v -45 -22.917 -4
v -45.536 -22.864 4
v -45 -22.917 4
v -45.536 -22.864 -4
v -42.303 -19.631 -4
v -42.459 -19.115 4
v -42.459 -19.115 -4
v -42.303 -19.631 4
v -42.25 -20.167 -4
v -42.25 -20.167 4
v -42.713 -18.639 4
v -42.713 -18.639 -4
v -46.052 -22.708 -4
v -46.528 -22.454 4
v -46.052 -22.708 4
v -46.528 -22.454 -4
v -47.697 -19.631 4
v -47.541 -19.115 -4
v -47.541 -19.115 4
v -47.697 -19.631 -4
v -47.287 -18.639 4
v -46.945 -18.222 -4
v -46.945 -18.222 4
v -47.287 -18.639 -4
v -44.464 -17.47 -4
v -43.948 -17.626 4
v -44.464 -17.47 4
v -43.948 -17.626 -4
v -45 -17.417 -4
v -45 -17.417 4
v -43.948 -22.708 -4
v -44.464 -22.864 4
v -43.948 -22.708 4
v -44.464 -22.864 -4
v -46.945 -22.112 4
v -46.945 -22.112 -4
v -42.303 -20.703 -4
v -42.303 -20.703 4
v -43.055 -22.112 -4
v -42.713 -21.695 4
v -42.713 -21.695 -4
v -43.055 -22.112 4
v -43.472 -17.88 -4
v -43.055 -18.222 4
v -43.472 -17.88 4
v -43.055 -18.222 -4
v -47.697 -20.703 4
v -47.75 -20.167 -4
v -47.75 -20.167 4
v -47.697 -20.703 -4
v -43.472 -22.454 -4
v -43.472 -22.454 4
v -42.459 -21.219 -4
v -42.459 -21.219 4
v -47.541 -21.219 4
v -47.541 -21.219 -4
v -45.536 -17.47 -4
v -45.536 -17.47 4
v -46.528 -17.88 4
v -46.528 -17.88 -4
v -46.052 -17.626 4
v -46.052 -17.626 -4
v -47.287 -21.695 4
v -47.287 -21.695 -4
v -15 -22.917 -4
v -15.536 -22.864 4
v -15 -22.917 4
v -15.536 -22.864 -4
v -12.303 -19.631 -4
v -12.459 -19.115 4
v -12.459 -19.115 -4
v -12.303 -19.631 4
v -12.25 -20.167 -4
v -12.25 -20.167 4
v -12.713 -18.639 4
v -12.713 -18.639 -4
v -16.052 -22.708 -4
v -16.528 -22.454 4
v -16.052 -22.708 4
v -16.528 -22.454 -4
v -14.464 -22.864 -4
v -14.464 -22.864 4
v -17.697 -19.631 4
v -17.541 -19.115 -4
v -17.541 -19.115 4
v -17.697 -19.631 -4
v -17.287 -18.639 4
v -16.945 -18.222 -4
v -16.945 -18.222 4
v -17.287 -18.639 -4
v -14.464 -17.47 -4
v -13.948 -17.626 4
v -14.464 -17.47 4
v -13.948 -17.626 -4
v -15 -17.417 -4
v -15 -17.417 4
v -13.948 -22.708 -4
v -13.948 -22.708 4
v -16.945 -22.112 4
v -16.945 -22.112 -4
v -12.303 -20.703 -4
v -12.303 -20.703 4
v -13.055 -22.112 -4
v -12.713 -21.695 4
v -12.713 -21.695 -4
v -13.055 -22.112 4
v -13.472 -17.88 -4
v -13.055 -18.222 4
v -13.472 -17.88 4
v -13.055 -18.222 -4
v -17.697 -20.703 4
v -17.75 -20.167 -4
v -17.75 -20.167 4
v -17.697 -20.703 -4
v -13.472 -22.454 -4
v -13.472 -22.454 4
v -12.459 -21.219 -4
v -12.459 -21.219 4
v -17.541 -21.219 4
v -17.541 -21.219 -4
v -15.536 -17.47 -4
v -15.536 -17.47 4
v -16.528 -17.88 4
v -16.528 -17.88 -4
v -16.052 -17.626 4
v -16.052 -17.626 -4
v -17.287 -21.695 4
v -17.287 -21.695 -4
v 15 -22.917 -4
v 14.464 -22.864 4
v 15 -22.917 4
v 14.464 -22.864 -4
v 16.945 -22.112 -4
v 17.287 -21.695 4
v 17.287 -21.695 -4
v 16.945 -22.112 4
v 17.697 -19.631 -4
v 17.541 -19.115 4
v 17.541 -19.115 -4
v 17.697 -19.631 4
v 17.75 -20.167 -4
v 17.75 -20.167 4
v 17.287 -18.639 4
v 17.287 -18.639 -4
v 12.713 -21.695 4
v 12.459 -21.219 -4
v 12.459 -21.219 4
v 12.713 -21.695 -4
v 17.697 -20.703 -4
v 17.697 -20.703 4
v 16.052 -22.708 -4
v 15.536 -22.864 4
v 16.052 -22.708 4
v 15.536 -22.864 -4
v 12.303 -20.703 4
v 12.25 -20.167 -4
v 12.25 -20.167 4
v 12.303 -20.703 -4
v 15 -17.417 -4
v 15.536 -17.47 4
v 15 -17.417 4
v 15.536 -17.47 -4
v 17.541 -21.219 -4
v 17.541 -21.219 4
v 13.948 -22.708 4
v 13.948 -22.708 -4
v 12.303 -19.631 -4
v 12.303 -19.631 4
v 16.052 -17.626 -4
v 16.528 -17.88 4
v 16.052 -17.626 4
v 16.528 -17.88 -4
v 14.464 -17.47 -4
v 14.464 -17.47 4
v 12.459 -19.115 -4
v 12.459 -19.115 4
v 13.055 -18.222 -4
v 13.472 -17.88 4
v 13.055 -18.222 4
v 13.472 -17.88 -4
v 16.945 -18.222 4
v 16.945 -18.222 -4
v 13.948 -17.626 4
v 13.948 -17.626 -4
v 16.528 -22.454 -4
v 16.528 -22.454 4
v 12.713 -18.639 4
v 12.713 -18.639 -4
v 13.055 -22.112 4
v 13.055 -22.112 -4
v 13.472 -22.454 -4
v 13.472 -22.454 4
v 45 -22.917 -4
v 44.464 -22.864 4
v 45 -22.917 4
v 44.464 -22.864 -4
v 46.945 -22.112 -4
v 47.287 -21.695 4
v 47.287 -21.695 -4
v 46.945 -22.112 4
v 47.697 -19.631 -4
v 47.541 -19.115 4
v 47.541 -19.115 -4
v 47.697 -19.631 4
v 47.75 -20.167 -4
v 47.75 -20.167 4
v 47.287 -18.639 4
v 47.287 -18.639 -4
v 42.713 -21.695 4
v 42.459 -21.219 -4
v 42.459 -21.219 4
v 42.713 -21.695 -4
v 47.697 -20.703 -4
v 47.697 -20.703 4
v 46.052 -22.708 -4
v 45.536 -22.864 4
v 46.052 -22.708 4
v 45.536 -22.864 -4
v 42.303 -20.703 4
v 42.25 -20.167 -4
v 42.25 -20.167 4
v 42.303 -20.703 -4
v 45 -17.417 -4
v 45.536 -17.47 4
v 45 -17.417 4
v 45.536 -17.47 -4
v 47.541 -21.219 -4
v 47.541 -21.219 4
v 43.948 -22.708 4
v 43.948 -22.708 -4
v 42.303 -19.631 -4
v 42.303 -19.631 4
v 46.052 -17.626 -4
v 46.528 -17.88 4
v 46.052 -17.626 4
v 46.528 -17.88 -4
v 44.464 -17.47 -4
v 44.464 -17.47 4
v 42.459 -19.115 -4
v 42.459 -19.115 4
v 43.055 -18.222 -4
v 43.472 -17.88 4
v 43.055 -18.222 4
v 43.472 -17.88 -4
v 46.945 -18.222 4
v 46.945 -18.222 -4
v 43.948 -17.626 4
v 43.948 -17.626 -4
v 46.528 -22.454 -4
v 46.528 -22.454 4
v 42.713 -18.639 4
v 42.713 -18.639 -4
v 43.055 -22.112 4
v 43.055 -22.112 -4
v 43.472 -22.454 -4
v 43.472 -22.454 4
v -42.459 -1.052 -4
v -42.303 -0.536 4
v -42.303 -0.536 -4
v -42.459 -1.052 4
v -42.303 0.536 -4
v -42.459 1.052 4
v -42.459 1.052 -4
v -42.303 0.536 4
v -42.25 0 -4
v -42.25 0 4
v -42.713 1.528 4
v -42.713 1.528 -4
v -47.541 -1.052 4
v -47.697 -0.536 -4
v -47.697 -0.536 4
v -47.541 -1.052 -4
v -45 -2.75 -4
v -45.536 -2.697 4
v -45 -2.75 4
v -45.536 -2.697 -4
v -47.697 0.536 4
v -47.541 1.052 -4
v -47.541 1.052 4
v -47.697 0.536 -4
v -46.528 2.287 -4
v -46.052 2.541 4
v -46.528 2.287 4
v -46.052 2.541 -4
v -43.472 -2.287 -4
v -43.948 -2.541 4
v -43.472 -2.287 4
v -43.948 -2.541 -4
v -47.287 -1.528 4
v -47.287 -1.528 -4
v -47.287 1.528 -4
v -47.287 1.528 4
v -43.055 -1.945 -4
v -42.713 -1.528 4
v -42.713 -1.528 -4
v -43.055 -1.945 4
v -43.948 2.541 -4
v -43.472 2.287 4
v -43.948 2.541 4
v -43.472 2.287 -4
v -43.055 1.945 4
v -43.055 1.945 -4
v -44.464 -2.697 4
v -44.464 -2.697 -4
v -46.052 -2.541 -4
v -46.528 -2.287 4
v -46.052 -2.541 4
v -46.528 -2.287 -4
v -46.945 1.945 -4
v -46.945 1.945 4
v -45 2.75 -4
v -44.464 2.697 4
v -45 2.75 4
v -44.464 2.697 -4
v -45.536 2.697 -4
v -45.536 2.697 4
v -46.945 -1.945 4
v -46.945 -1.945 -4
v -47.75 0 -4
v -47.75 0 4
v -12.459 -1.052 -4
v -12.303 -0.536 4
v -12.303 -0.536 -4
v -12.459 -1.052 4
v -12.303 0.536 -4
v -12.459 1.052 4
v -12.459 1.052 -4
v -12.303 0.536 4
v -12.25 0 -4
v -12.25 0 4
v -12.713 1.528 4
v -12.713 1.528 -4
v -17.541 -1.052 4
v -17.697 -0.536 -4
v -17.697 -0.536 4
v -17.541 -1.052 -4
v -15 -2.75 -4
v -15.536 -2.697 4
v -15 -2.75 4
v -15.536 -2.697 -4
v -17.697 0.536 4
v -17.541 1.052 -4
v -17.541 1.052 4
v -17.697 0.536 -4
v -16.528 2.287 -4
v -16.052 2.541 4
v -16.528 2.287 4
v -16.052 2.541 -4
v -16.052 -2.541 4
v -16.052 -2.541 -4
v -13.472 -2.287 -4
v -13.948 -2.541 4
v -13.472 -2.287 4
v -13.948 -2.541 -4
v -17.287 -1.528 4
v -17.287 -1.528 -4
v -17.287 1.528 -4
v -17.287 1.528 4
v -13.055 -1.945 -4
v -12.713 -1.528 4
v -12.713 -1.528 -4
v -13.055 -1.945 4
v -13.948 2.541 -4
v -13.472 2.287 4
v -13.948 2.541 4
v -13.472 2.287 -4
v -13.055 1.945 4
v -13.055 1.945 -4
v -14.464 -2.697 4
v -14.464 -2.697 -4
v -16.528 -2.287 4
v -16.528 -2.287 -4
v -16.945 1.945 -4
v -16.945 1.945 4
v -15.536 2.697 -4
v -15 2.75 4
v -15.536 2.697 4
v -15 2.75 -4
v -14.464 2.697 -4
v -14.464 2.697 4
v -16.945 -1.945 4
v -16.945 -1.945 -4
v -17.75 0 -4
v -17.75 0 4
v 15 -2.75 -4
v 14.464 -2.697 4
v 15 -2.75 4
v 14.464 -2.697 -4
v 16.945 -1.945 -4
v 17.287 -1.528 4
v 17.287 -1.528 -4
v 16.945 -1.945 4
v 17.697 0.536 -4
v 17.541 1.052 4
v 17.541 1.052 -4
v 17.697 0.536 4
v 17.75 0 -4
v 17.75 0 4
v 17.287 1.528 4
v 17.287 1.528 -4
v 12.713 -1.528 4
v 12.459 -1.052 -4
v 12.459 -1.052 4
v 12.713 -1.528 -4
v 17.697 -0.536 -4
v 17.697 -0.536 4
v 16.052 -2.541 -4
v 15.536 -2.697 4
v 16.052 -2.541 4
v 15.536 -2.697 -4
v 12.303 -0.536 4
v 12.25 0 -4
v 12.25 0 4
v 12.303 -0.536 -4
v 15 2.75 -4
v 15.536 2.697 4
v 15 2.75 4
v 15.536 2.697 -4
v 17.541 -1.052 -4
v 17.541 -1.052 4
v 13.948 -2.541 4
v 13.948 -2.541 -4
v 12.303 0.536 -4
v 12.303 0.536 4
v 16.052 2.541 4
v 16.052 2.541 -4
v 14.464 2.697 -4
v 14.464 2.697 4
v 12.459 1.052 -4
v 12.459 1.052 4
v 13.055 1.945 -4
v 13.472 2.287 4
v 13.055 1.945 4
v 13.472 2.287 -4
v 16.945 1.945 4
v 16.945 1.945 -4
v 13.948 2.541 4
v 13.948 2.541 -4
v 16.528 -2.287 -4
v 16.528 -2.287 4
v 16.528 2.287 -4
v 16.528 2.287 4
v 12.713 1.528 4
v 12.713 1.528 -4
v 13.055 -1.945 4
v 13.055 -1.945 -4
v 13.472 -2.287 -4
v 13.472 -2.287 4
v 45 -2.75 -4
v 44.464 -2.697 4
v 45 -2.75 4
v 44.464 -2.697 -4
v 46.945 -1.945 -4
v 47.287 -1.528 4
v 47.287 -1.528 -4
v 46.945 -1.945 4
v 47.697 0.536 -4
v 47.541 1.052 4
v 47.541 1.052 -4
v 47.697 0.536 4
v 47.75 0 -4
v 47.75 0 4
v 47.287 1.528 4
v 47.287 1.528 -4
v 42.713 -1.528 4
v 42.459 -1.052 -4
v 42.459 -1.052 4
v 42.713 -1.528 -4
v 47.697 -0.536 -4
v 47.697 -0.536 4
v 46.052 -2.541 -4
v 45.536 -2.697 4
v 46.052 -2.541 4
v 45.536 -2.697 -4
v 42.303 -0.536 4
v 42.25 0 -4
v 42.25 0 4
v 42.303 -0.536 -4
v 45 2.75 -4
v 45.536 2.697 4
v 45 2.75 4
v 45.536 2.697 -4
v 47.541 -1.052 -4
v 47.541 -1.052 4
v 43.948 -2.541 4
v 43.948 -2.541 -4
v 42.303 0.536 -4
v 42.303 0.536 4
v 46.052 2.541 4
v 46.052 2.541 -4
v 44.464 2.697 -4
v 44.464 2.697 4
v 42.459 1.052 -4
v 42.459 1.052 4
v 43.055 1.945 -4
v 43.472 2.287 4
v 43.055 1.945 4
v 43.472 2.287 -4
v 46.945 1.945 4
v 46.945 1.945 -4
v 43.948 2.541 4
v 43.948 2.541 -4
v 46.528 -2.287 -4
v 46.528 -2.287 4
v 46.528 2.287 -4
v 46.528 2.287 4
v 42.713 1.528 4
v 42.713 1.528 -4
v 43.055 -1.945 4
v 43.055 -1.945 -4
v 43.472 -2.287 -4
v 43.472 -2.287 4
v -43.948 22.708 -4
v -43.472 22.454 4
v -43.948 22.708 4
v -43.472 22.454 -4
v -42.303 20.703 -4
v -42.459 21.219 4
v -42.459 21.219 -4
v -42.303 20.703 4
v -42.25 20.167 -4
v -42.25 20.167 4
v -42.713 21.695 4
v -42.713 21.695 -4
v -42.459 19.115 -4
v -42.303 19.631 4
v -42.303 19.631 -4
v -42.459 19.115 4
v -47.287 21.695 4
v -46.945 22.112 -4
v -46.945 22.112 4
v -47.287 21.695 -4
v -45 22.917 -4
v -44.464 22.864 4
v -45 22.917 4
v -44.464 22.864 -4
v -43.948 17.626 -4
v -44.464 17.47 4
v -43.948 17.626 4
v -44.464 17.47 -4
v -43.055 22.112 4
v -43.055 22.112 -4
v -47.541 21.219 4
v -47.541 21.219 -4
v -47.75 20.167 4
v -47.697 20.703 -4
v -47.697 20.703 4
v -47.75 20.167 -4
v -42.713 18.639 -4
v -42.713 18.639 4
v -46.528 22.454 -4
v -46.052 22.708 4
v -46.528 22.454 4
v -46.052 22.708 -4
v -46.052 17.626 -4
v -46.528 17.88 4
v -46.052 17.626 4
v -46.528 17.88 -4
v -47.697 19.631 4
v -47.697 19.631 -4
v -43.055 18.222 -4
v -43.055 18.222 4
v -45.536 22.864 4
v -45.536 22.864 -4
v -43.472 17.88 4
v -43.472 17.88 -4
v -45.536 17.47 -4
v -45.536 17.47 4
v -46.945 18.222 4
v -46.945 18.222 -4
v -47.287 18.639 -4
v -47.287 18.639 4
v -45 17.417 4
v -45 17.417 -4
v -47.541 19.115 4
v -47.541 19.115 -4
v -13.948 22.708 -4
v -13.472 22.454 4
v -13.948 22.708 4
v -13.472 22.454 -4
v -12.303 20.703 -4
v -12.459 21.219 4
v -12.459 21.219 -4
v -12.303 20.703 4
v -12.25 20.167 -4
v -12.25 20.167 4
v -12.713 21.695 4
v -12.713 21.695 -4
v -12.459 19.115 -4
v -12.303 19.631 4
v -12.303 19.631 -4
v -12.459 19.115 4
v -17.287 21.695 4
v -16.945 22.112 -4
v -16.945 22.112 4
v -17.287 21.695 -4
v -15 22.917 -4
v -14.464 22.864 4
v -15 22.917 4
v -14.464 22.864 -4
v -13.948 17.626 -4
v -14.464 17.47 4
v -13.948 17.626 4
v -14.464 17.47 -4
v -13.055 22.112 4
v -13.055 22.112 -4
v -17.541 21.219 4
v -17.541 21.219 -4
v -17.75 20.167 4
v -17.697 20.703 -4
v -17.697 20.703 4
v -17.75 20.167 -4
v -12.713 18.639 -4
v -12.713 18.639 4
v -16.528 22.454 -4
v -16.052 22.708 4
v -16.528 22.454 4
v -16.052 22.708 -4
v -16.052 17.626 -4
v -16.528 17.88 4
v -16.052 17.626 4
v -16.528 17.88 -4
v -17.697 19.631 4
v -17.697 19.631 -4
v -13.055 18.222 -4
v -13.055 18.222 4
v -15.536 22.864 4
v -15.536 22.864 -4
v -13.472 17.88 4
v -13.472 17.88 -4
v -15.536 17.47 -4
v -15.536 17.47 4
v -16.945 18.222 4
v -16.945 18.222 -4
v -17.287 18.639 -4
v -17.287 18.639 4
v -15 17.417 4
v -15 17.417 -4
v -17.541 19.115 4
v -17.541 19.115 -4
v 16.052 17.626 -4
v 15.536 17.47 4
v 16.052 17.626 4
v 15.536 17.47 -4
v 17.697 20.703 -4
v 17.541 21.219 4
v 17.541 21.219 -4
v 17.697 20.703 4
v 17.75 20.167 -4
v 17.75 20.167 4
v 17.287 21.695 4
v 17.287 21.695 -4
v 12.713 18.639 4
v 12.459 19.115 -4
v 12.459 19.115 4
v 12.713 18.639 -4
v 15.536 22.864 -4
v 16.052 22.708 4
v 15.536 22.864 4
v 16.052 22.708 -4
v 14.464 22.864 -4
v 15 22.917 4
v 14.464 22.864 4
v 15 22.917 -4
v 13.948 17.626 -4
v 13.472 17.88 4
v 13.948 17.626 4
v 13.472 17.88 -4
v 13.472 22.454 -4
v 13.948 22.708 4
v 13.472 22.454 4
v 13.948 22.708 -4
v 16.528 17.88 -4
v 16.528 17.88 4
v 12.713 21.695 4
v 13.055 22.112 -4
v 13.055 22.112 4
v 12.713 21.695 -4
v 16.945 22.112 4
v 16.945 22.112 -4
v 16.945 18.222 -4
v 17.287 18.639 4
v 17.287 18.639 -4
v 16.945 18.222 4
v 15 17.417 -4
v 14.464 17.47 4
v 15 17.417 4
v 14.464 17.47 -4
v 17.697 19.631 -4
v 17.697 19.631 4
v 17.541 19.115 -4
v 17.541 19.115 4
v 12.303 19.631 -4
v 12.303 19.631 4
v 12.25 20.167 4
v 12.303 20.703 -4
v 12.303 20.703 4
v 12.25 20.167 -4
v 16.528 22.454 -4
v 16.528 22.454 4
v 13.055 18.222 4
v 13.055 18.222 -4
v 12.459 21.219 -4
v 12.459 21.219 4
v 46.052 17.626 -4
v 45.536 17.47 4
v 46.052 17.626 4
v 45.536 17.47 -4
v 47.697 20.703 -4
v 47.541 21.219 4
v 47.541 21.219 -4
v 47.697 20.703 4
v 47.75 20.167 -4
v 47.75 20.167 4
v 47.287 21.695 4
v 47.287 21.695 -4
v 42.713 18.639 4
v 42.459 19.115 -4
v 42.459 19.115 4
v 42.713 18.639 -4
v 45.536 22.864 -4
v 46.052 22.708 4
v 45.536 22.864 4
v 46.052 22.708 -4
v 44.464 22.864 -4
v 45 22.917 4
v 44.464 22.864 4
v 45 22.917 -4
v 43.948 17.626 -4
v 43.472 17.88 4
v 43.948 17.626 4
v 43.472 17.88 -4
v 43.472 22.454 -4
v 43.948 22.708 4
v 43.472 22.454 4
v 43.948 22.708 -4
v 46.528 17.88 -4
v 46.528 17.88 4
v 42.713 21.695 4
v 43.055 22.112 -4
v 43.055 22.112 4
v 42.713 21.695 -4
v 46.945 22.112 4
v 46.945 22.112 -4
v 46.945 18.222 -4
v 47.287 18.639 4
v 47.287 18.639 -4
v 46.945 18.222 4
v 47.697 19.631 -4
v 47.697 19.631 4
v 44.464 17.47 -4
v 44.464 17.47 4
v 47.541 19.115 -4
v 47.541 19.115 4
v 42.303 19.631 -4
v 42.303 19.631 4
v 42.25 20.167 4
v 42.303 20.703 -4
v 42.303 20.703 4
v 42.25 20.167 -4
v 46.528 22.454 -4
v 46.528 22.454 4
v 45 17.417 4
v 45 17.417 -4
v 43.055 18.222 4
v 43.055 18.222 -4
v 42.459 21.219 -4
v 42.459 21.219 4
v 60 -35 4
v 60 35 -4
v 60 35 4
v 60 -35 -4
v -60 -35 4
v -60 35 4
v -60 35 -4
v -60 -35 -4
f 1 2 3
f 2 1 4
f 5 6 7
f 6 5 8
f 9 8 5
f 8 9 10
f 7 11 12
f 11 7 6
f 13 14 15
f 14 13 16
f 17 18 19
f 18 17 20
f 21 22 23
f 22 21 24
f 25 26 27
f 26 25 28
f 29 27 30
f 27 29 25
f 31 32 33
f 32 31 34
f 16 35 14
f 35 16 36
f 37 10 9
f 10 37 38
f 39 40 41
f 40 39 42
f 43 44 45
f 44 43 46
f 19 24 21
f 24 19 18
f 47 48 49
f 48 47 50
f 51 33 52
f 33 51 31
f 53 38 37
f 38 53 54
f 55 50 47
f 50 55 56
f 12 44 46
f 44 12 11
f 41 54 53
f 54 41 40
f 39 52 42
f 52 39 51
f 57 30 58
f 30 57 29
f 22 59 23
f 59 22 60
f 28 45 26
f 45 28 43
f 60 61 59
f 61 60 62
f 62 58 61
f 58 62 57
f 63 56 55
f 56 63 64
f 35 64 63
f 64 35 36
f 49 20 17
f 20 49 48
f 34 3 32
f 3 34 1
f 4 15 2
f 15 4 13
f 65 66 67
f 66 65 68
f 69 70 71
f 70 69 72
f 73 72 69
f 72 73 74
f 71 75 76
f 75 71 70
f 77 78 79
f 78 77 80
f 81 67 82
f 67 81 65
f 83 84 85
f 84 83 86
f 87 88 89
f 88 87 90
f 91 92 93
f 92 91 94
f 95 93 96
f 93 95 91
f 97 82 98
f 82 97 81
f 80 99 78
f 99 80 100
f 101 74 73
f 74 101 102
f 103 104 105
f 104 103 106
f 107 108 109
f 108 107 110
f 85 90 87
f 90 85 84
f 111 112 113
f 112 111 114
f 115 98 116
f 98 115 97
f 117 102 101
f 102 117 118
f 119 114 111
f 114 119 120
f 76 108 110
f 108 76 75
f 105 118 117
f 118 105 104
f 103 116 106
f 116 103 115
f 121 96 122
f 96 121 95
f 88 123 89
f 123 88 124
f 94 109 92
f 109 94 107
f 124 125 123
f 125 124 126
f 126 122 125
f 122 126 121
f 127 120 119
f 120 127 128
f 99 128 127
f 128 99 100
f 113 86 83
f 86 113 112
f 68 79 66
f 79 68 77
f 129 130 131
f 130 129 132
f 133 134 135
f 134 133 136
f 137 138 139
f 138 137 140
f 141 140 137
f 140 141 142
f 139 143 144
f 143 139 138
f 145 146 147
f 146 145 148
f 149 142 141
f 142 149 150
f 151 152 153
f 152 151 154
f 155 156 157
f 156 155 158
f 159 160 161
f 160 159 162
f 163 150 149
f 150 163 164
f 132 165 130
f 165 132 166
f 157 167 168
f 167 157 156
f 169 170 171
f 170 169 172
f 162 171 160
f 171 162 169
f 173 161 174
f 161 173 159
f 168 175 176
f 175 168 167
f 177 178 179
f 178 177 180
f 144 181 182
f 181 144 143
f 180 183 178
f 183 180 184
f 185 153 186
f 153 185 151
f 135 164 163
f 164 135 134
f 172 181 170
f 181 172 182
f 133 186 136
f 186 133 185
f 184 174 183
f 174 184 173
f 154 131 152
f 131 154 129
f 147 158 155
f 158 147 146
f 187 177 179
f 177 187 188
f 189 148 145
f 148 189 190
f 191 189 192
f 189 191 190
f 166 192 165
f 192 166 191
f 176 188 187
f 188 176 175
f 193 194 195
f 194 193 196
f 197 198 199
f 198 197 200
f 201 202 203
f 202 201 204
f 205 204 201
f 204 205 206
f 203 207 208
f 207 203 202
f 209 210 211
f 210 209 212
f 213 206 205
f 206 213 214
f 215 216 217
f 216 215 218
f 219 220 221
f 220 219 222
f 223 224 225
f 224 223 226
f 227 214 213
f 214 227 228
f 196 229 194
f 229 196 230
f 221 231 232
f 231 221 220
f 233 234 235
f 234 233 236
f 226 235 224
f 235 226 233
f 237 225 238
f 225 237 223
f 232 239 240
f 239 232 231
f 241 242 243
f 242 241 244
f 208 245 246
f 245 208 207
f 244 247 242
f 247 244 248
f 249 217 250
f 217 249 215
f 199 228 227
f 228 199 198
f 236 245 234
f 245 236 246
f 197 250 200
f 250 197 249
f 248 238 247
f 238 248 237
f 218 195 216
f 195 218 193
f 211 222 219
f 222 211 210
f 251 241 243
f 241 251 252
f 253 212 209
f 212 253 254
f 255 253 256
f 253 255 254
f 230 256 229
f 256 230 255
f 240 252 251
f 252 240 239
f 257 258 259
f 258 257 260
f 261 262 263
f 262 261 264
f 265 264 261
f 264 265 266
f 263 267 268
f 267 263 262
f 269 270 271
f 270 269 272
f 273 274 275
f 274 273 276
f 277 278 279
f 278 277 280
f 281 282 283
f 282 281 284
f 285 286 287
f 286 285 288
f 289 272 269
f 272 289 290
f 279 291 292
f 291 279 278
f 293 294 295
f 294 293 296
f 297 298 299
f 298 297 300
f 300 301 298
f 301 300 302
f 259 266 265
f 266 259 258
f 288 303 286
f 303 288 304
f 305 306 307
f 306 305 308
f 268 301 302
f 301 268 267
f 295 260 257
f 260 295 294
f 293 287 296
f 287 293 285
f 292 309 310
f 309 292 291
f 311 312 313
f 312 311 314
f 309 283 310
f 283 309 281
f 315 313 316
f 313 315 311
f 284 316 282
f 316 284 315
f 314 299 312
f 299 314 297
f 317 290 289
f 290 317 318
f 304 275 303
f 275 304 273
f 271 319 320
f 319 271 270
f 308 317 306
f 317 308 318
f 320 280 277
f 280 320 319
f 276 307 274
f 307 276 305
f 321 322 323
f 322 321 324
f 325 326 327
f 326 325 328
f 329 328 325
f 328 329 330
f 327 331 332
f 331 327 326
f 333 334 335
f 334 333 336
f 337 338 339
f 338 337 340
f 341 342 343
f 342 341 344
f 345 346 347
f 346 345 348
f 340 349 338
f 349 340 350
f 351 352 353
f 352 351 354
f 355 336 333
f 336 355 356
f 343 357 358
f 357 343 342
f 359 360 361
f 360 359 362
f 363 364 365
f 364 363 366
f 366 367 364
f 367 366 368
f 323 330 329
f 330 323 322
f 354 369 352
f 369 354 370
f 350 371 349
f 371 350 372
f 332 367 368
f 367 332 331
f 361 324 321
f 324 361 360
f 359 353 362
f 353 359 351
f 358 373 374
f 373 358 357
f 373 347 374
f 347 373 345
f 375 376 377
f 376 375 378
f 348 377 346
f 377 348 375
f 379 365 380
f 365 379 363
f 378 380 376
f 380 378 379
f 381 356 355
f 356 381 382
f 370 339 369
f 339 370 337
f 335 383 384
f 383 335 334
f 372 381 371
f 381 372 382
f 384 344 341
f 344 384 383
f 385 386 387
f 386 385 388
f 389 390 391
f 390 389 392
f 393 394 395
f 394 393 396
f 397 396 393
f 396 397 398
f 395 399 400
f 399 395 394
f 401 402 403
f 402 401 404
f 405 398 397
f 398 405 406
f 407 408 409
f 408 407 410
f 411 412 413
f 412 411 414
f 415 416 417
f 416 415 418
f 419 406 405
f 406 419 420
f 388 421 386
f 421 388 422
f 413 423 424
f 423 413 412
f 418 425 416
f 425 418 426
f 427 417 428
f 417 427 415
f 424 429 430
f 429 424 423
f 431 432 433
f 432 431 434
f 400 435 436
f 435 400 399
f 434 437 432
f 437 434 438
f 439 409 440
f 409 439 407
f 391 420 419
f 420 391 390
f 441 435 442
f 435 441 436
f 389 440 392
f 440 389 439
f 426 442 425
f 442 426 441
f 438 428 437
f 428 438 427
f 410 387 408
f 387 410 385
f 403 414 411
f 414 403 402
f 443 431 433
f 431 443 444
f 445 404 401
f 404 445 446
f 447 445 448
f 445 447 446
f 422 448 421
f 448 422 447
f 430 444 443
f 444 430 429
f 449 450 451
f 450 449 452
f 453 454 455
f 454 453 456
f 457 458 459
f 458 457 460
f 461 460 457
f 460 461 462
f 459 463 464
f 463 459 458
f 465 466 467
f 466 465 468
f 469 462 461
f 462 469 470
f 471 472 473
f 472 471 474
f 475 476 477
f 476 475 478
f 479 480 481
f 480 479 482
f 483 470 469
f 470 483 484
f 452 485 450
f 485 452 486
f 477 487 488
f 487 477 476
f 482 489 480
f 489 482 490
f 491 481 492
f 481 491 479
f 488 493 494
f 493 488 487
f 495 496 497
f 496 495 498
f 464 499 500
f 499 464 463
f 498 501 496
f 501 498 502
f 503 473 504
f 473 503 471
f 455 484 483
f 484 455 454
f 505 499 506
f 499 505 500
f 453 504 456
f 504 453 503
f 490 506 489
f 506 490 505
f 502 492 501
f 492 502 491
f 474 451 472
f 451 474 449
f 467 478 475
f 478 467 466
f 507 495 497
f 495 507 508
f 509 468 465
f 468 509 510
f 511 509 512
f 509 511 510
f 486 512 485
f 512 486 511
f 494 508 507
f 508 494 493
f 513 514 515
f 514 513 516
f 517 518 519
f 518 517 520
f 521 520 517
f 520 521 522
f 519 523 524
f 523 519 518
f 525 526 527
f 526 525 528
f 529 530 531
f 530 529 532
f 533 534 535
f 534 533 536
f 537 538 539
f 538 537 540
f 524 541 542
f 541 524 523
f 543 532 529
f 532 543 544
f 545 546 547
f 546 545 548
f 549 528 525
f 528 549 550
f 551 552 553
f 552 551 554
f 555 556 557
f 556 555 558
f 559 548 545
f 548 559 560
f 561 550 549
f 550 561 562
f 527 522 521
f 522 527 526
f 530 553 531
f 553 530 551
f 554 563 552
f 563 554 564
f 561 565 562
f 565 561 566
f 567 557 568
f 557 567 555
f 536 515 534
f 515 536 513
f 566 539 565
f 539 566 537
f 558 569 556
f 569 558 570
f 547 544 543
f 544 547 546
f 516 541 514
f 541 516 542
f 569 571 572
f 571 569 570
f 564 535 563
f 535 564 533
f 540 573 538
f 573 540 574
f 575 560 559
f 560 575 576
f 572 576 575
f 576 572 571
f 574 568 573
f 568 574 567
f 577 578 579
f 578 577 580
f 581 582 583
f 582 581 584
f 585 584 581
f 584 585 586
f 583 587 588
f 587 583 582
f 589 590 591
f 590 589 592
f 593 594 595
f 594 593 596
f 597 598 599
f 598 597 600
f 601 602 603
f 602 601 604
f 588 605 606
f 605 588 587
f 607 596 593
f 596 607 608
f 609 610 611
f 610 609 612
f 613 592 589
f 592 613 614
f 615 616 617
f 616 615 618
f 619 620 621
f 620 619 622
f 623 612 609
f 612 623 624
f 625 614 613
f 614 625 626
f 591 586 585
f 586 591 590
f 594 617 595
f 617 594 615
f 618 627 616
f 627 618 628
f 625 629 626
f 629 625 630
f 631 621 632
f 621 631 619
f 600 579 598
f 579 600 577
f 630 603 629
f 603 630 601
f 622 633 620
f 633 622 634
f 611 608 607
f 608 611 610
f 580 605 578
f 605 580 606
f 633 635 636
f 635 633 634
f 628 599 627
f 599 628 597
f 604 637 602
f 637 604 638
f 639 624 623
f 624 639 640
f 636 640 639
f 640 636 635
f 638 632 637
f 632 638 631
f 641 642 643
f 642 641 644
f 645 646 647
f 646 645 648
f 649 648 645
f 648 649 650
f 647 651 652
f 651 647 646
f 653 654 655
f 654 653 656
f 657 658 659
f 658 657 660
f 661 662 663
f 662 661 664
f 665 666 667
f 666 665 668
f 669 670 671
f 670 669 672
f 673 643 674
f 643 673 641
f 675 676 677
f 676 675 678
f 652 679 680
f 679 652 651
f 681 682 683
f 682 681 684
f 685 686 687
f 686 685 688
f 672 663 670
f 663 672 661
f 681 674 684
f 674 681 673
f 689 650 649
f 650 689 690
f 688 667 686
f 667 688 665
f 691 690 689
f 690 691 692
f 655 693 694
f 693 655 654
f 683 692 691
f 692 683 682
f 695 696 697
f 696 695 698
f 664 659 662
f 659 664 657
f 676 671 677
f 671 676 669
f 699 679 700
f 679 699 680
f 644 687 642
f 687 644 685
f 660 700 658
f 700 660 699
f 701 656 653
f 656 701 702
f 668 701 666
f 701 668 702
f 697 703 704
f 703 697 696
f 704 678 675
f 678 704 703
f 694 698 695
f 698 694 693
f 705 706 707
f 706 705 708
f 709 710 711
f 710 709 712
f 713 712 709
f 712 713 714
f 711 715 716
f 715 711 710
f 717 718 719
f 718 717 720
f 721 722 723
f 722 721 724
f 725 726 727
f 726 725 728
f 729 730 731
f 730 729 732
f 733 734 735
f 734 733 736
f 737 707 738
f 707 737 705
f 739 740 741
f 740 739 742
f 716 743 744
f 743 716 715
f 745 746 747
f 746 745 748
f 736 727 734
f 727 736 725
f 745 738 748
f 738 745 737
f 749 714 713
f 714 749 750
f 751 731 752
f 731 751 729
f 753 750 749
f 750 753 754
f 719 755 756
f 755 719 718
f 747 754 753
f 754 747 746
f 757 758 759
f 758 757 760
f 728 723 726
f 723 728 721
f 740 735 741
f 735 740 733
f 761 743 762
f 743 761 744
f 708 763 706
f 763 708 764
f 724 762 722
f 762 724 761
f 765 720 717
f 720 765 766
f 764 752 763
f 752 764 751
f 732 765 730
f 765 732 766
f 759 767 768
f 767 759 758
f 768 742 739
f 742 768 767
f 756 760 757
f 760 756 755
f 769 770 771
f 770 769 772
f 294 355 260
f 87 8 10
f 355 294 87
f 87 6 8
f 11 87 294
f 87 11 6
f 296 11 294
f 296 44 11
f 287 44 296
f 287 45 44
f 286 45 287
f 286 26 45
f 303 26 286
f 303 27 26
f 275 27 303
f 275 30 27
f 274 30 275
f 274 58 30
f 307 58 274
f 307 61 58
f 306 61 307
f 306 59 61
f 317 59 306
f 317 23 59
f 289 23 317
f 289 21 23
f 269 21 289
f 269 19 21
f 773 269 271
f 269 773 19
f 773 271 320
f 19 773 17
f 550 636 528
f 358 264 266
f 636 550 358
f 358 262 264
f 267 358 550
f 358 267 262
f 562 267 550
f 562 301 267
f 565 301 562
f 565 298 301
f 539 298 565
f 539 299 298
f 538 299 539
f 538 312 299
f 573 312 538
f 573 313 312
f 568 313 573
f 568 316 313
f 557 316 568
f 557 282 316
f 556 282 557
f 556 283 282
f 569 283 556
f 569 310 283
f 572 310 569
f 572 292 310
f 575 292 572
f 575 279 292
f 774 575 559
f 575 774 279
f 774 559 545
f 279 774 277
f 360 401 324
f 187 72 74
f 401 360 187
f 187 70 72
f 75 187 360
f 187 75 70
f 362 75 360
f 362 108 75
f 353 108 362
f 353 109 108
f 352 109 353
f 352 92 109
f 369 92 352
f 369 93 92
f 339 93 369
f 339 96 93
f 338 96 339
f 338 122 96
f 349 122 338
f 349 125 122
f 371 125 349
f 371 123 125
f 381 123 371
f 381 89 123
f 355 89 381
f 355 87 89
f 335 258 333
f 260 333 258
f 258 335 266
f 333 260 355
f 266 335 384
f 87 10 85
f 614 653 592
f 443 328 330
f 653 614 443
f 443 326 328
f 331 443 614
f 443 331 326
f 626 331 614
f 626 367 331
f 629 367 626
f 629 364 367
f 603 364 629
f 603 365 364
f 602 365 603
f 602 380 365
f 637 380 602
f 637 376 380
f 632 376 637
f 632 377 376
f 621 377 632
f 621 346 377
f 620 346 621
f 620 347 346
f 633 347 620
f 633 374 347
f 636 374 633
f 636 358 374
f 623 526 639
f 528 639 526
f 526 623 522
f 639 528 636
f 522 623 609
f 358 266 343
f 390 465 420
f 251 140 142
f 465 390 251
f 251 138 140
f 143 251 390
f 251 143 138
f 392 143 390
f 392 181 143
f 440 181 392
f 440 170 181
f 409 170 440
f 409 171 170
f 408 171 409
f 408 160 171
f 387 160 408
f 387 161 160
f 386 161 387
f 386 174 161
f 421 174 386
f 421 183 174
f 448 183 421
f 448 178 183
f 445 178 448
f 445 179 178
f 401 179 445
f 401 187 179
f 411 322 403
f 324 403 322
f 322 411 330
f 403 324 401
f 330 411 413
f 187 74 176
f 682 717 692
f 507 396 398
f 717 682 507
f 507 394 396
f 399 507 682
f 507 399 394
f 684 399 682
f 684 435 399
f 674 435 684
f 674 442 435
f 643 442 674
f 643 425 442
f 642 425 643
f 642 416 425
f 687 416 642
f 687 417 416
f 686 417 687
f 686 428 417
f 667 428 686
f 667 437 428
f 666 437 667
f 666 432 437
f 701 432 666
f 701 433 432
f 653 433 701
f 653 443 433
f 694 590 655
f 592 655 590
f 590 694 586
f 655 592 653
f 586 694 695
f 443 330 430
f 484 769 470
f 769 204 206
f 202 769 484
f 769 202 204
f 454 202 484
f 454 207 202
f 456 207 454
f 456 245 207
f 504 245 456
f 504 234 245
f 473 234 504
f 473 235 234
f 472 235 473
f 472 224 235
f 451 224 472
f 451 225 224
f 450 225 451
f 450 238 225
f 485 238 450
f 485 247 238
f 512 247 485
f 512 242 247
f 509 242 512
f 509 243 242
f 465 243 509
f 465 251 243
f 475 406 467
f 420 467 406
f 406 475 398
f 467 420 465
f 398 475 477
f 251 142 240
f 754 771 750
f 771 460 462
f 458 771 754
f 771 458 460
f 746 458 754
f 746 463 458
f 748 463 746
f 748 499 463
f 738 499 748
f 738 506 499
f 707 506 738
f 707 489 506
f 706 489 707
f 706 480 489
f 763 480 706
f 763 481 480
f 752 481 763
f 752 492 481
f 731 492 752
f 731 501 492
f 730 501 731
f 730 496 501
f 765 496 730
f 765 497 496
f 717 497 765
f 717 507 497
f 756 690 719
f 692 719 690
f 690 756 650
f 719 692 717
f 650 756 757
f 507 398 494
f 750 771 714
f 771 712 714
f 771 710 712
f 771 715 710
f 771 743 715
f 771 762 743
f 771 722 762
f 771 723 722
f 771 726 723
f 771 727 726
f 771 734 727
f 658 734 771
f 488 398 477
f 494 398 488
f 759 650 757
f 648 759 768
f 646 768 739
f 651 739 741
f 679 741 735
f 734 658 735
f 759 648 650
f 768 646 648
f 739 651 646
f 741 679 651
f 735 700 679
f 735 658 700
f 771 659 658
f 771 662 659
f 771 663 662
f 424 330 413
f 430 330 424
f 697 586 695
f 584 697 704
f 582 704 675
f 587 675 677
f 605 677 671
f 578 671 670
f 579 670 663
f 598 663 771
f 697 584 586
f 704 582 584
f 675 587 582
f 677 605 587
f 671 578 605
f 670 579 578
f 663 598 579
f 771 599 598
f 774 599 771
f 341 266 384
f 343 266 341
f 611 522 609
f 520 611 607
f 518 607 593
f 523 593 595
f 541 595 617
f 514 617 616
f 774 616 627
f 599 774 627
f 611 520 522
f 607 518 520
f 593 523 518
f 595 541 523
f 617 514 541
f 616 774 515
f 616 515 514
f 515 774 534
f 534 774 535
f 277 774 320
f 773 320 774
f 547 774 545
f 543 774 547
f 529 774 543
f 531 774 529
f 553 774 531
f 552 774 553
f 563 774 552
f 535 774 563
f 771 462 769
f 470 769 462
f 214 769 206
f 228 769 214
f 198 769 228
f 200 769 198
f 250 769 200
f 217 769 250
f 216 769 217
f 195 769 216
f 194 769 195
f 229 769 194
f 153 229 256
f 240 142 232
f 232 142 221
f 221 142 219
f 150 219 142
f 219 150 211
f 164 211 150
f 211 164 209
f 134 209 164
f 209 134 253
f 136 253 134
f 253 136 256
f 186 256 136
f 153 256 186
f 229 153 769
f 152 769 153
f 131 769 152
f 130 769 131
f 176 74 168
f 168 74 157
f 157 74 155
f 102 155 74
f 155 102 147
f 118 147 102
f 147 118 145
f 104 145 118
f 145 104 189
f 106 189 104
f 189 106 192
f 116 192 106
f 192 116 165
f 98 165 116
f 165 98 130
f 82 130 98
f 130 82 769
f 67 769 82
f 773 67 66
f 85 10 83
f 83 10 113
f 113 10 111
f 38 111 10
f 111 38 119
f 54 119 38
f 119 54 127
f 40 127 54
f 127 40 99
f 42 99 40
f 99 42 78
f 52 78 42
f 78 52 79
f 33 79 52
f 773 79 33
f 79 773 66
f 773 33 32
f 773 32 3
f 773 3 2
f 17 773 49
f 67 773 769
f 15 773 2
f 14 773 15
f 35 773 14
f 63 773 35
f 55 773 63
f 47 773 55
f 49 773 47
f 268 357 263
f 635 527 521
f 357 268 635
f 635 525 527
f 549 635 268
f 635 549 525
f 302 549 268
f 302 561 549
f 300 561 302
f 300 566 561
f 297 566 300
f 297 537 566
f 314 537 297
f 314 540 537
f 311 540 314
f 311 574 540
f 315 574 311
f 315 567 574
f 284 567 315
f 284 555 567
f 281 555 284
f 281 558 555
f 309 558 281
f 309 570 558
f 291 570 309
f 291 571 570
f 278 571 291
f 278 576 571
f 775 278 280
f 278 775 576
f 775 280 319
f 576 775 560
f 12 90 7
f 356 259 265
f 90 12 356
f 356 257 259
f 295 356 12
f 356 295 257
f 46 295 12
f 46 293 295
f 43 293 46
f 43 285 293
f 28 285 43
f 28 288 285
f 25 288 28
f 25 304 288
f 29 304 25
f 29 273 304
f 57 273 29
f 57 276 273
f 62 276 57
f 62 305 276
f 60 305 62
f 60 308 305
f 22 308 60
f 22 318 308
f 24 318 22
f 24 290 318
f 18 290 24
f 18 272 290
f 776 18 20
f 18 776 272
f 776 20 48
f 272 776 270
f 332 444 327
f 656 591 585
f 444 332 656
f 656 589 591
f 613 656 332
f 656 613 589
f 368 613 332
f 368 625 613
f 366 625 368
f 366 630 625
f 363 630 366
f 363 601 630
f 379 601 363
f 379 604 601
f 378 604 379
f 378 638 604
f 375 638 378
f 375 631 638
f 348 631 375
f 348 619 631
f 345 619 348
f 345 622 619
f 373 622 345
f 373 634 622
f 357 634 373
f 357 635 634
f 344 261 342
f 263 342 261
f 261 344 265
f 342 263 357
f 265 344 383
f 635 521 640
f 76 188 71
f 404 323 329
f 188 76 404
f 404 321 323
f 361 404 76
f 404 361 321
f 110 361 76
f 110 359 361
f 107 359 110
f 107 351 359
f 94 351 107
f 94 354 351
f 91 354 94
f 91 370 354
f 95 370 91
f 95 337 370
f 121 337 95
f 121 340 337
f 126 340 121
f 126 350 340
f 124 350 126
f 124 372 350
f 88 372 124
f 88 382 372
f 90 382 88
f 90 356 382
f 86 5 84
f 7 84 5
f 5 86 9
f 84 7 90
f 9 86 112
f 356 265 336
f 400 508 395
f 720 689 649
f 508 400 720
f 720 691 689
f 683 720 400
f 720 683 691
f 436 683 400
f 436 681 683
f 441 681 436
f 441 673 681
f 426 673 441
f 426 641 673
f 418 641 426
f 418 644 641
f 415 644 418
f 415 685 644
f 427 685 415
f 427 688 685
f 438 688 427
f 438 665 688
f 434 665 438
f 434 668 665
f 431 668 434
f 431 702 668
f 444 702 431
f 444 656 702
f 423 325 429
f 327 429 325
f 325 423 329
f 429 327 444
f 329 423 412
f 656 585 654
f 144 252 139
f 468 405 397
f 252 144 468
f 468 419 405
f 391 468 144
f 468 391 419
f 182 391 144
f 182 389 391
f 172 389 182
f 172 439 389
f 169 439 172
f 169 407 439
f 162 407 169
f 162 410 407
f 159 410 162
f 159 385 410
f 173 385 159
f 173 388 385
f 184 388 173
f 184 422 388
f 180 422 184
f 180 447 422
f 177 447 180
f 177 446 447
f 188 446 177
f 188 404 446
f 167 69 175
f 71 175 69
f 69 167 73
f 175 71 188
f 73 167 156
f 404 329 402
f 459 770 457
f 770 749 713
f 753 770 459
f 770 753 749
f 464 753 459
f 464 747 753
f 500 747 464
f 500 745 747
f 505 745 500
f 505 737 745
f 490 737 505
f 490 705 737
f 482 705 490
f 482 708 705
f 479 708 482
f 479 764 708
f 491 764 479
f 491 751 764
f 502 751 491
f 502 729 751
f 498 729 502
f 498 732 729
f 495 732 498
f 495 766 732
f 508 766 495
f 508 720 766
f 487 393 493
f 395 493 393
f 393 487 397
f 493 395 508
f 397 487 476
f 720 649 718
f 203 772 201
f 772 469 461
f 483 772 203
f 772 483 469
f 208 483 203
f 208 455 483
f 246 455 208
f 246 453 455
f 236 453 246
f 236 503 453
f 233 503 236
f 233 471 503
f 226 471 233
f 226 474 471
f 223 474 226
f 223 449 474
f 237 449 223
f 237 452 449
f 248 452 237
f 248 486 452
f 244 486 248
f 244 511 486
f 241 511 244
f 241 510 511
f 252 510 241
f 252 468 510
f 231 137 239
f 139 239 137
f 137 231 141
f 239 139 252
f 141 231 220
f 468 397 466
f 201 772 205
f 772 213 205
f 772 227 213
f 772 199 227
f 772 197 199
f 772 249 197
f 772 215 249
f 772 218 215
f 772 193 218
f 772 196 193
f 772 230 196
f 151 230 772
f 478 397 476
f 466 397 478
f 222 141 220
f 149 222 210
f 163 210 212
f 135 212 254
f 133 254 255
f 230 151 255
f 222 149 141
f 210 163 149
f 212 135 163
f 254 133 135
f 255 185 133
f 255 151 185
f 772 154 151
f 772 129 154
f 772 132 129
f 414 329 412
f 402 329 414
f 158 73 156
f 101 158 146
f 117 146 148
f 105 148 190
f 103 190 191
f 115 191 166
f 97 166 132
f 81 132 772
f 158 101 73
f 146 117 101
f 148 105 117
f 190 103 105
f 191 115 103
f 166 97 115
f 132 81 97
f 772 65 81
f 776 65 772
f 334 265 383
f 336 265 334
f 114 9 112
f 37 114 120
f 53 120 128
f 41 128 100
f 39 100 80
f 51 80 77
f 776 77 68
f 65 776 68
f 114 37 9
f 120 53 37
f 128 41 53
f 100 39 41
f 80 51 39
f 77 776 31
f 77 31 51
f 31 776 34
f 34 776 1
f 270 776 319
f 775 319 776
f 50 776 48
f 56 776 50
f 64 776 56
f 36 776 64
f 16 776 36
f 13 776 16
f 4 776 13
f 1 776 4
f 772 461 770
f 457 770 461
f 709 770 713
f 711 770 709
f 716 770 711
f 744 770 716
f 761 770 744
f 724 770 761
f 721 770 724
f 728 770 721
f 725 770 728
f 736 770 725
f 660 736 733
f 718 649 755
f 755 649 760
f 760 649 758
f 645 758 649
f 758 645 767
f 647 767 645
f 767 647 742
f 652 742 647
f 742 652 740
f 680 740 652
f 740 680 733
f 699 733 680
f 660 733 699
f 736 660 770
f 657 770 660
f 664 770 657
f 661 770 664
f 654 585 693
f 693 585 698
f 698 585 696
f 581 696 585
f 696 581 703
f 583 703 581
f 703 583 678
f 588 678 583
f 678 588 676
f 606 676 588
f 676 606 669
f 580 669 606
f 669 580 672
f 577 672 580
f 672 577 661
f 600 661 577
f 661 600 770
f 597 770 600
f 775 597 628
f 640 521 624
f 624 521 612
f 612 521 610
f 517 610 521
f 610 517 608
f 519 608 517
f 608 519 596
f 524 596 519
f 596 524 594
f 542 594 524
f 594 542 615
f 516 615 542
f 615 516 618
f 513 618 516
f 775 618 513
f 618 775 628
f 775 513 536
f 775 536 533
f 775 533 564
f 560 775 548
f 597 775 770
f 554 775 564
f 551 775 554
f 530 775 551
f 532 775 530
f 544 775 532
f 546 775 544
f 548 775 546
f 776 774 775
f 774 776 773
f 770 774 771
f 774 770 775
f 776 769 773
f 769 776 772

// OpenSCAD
$fn = 32;

// ----------------------------------------------------------------------
// Perforated panel 120 x 70 x 8
// 3 x 4 Ø5.5 holes, grid layout
// ----------------------------------------------------------------------

// --- parameters (mm) ---
panel = [120, 70, 8];  // overall size (x, y, z)
hole_d = 5.5;          // hole diameter
pitch_x = 30;          // hole pitch along X
pitch_y = 20.167;      // hole pitch along Y

// --- derived feature positions (mm) ---
margin = hole_d / 2 + 2;            // = 4.75   clearance from the panel edge
cols = floor((panel[0] - 2 * margin) / pitch_x) + 1;  // = 4   how many columns fit in X
rows = floor((panel[1] - 2 * margin) / pitch_y) + 1;  // = 3   how many rows fit in Y
span_x = (cols - 1) * pitch_x + 0;  // = 90   width of the field
span_y = (rows - 1) * pitch_y;      // = 40.33   height of the field
origin_x = -span_x / 2;             // = -45   X of the first hole
origin_y = -span_y / 2;             // = -20.17   Y of the first row
holes = rows * cols;                // = 12   holes in total
feature_centers = [
  [origin_x + 0 * pitch_x, origin_y + 0 * pitch_y],
  [origin_x + 1 * pitch_x, origin_y + 0 * pitch_y],
  [origin_x + 2 * pitch_x, origin_y + 0 * pitch_y],
  [origin_x + 3 * pitch_x, origin_y + 0 * pitch_y],
  [origin_x + 0 * pitch_x, origin_y + 1 * pitch_y],
  [origin_x + 1 * pitch_x, origin_y + 1 * pitch_y],
  [origin_x + 2 * pitch_x, origin_y + 1 * pitch_y],
  [origin_x + 3 * pitch_x, origin_y + 1 * pitch_y],
  [origin_x + 0 * pitch_x, origin_y + 2 * pitch_y],
  [origin_x + 1 * pitch_x, origin_y + 2 * pitch_y],
  [origin_x + 2 * pitch_x, origin_y + 2 * pitch_y],
  [origin_x + 3 * pitch_x, origin_y + 2 * pitch_y]
];   // hole centres, used verbatim by the cutter loop

// panel outline, every hole through
difference() {
  cube(panel, center = true);
  for (centre = feature_centers)
    translate([centre[0], centre[1], 0])
      cylinder(d = hole_d, h = panel[2] + 2, center = true);
}
